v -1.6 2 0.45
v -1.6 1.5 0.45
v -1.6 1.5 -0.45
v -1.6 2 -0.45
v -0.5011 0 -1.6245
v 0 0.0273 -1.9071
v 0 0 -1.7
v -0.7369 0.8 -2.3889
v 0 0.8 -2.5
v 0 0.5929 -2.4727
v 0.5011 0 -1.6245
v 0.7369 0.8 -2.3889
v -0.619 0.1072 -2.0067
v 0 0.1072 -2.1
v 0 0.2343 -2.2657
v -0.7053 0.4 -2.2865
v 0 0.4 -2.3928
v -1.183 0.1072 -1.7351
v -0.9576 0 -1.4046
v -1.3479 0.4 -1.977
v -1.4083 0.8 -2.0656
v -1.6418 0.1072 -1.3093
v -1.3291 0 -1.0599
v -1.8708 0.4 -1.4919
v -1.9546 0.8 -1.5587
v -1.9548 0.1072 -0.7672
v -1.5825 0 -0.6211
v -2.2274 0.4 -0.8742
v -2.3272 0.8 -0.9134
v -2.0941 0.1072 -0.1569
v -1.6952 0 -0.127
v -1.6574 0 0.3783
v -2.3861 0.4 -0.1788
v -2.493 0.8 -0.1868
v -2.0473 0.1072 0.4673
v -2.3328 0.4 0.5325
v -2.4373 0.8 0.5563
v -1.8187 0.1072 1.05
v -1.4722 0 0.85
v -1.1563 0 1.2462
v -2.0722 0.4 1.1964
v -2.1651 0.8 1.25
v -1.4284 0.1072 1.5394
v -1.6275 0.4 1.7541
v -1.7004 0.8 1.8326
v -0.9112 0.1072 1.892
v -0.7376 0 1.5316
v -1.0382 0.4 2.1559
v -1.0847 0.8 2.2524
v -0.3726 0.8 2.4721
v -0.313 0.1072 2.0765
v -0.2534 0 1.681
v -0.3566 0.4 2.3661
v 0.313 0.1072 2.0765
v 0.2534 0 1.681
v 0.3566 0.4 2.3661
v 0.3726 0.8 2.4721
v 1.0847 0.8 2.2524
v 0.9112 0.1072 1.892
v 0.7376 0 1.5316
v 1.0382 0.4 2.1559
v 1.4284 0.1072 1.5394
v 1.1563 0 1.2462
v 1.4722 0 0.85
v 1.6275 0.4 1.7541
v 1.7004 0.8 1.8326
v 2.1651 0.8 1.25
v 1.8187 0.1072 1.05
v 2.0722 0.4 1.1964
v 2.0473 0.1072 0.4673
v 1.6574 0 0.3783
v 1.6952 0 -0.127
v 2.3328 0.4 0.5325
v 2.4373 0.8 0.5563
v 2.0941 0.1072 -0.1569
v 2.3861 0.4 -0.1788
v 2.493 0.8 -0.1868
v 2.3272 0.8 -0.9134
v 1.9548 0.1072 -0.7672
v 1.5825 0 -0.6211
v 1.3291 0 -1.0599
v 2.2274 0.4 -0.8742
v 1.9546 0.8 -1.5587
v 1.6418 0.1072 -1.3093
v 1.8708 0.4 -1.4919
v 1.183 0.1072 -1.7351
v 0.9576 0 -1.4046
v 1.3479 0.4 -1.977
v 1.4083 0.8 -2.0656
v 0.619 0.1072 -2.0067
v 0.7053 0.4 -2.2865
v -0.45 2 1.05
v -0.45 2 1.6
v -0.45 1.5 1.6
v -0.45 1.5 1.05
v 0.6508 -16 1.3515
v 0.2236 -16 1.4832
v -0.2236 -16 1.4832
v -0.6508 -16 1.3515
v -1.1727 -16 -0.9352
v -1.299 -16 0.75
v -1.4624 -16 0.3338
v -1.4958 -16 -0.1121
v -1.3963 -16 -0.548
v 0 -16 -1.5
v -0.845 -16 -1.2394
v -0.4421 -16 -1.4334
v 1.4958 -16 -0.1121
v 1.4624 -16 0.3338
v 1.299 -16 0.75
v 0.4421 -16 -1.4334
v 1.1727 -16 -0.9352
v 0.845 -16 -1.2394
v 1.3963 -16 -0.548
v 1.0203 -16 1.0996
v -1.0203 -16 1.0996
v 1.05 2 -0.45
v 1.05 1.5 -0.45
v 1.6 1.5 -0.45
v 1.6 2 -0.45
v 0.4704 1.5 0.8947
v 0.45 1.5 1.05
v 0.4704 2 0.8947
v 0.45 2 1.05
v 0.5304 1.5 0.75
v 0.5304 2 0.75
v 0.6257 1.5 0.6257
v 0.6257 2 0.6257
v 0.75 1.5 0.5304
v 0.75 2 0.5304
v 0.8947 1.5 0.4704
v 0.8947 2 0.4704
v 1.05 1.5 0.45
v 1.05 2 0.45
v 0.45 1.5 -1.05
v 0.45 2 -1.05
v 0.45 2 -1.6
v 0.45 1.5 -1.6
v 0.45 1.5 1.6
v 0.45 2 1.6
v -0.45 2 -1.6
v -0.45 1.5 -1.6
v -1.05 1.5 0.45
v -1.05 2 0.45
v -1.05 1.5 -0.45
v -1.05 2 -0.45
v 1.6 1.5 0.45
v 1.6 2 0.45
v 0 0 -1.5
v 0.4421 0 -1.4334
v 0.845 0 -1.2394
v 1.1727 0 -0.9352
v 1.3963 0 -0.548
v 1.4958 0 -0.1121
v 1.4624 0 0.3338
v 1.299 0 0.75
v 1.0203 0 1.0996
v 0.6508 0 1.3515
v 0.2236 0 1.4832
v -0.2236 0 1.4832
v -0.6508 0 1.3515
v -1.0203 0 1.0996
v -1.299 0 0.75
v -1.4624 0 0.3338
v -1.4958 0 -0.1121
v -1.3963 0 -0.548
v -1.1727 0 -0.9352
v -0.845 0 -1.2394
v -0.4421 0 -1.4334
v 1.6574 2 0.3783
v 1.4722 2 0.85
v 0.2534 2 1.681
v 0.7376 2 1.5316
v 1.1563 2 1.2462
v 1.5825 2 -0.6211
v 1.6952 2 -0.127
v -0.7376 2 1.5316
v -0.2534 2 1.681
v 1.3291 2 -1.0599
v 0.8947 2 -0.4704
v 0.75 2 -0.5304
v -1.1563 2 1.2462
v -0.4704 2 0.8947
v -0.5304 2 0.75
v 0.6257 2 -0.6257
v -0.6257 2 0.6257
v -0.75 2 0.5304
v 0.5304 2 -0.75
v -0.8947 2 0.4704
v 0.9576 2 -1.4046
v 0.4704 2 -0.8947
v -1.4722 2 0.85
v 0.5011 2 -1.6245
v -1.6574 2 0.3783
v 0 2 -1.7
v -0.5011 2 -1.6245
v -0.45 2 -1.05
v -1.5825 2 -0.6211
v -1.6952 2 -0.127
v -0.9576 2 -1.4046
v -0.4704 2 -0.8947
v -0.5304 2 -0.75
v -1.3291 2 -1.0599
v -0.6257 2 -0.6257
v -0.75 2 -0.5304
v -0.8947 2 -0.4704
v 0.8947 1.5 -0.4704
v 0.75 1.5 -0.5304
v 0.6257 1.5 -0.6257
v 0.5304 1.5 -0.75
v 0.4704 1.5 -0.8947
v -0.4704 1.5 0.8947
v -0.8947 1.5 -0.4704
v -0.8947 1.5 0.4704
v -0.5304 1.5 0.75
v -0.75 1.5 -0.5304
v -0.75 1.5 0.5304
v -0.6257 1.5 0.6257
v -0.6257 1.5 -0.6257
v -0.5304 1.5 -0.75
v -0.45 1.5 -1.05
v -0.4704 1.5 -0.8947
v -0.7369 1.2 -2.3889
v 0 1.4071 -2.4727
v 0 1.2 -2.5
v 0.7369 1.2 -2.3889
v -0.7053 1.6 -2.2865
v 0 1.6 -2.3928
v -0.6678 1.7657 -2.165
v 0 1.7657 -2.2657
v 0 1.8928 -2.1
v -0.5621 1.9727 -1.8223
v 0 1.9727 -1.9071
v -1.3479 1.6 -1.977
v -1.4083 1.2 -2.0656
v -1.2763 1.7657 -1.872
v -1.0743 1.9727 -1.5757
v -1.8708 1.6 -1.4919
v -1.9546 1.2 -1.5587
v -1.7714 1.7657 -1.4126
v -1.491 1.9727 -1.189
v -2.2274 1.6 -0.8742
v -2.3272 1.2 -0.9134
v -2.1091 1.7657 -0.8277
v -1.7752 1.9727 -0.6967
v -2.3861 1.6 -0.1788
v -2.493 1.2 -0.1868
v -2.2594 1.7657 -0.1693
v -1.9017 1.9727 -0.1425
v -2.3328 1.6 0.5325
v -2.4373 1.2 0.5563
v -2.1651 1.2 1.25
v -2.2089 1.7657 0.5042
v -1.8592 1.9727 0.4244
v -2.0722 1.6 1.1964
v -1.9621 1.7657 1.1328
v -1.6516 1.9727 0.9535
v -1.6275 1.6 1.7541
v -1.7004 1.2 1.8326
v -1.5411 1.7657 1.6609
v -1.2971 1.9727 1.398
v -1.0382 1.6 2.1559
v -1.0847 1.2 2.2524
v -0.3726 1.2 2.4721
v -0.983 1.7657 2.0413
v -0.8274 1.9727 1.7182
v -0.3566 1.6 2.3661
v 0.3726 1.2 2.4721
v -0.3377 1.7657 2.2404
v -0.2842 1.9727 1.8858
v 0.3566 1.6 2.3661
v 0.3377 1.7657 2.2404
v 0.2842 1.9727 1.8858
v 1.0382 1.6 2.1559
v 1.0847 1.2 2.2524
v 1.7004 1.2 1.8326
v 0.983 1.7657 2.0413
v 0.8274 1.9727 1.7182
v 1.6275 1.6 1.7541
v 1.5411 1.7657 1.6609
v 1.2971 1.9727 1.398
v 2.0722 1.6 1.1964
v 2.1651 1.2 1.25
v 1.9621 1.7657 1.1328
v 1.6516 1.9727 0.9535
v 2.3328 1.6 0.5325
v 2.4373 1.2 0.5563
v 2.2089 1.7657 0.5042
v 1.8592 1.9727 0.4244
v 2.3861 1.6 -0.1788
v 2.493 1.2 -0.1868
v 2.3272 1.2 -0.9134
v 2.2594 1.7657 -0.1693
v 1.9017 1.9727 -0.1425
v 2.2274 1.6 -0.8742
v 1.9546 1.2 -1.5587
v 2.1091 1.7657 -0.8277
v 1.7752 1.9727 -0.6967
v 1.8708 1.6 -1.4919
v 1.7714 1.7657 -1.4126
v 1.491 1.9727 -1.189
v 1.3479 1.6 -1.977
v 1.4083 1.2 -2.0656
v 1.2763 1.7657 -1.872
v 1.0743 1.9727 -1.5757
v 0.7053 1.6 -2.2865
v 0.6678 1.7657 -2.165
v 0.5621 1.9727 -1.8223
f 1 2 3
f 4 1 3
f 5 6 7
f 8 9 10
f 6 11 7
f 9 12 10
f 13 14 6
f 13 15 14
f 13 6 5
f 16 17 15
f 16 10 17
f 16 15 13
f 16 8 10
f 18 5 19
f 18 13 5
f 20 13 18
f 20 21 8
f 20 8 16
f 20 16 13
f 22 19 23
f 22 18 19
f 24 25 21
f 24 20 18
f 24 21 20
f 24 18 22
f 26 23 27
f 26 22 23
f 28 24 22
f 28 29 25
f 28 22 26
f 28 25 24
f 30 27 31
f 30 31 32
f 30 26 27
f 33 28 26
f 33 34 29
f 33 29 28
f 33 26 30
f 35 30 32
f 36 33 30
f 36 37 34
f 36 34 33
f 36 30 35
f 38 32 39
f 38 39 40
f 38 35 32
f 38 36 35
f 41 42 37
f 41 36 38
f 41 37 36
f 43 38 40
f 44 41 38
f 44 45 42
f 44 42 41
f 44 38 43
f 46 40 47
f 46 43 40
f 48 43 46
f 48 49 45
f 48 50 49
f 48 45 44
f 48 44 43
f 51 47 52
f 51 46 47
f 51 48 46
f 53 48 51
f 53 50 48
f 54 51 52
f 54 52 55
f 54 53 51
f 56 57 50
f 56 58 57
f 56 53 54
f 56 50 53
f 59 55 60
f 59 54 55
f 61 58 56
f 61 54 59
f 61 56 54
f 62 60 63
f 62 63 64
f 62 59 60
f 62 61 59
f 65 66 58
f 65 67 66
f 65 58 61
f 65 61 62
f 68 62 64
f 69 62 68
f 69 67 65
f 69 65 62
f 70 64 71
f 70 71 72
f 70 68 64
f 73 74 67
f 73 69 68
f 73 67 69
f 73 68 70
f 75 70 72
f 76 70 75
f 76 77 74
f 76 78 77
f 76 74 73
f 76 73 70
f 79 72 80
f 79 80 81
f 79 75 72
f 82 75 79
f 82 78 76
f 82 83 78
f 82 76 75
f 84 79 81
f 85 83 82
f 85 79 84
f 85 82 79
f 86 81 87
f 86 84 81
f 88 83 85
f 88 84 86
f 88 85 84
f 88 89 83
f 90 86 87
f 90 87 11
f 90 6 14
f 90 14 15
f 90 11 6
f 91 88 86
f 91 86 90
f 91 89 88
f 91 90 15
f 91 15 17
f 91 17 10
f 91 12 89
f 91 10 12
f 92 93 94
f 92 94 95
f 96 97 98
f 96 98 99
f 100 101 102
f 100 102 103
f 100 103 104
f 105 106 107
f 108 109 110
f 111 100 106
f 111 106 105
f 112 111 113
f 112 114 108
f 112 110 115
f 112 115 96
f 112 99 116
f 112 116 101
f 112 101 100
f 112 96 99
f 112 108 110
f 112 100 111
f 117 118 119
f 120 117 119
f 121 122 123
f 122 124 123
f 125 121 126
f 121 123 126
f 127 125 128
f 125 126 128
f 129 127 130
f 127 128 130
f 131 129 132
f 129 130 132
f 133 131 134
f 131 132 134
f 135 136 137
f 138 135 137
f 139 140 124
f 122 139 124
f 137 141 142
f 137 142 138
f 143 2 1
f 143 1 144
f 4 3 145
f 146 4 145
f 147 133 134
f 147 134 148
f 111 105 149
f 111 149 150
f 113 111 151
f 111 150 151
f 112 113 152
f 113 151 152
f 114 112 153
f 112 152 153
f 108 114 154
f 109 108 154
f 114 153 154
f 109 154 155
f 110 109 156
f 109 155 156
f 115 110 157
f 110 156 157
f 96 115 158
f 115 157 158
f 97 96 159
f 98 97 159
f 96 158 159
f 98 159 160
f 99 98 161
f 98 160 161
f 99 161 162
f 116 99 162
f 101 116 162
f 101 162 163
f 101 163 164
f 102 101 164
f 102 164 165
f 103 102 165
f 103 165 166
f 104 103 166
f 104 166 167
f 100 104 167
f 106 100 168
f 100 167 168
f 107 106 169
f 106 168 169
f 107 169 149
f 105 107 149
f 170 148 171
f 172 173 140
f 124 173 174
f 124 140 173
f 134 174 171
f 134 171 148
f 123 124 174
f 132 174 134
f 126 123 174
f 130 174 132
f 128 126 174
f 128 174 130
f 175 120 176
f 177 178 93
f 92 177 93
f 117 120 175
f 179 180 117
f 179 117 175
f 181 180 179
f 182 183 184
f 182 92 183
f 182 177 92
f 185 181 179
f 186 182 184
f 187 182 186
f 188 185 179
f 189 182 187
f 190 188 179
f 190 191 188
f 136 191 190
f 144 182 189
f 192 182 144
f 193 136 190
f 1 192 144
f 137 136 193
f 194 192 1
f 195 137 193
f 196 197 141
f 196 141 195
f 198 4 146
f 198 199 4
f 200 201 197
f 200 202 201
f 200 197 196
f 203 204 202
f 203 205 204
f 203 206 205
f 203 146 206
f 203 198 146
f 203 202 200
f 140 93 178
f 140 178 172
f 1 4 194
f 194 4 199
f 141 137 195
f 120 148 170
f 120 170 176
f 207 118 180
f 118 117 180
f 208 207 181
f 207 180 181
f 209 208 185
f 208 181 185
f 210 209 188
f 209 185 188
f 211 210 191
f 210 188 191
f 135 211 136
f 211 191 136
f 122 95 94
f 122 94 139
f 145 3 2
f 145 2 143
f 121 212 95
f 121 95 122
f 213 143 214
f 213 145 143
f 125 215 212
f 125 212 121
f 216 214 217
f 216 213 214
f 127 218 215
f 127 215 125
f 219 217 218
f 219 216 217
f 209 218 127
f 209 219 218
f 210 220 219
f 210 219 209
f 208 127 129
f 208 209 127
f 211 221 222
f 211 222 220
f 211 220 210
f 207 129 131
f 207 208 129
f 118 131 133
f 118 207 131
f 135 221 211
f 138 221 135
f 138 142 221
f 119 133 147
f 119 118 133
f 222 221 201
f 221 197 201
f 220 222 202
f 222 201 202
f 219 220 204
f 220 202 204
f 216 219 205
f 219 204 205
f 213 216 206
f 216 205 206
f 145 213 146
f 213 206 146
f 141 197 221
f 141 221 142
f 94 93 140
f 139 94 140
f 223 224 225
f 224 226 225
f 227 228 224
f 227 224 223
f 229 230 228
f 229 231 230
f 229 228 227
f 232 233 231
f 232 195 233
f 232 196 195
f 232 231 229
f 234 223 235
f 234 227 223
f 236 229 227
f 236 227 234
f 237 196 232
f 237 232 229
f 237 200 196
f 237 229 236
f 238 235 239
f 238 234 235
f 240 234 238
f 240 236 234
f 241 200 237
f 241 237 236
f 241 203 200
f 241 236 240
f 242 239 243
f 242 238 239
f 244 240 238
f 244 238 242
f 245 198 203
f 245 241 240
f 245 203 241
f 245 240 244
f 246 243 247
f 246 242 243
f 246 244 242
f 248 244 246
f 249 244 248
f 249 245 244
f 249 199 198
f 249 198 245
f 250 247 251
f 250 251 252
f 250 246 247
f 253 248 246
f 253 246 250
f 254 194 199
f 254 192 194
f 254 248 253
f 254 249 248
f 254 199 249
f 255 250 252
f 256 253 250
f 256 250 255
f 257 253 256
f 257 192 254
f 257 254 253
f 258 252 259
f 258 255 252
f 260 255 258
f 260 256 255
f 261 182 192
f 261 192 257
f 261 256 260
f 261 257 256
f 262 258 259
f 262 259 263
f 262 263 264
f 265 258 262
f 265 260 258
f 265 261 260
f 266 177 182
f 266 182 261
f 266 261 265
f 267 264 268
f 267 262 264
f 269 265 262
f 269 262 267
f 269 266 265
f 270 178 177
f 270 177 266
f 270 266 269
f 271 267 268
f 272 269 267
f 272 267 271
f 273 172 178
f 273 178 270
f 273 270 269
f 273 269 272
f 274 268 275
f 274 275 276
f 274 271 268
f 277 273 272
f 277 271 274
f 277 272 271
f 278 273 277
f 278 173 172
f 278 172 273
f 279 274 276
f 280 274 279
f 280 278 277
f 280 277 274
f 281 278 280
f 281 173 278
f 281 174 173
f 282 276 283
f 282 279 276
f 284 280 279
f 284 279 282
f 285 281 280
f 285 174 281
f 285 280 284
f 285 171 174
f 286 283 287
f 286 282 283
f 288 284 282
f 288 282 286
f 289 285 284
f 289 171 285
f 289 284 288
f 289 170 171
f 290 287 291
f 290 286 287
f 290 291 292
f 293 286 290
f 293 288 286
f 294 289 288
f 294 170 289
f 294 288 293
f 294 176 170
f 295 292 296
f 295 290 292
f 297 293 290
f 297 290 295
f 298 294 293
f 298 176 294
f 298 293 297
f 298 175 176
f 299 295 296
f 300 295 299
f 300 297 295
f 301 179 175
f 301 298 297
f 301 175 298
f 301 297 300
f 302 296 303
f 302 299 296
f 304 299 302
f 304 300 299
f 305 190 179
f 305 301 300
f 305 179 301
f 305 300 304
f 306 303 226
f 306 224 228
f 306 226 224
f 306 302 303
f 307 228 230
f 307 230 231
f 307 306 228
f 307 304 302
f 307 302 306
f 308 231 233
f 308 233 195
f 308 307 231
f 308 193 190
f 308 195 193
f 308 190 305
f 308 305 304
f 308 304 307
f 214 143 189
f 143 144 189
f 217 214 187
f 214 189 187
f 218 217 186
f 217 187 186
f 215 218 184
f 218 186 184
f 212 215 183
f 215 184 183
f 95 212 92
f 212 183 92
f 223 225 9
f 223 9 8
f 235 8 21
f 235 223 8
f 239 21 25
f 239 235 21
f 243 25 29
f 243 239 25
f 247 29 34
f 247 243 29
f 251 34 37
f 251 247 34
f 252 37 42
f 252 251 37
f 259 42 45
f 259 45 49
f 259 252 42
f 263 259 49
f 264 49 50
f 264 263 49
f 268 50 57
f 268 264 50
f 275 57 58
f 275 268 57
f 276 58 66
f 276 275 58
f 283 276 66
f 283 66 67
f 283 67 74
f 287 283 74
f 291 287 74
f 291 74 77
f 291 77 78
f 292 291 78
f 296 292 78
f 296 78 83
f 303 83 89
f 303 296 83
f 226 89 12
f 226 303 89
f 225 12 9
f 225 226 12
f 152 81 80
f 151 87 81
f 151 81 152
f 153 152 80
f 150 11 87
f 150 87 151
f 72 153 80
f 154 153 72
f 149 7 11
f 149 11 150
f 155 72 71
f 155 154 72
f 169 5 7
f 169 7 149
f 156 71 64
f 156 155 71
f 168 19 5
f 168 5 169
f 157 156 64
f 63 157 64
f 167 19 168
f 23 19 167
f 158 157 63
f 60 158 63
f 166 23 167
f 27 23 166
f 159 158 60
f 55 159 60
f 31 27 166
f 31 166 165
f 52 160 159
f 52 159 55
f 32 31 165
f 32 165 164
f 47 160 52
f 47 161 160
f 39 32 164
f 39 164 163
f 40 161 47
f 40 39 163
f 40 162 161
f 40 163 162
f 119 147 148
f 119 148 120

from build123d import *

# Parameters (mm, degrees)
FILLET2_R           = 0.8
SKETCH3_W           = 0.9
SKETCH3_H           = 3.2
CUT_EXTRUDE1_DEPTH  = 0.5
SKETCH4_W           = 3.2
SKETCH4_H           = 0.9
CUT_EXTRUDE2_DEPTH  = 4.840572939
FILLET1_R           = 0.6
SKETCH2_R           = 1.5
BOSS_EXTRUDE1_DEPTH = 16


with BuildPart() as part:
    # Sketch1 → Revolve1 (revolve)
    with BuildSketch(Plane(origin=(0, 0, 0), x_dir=(0, 0, -1), z_dir=(1, 0, 0))):
        with BuildLine():
            Line((0, 2), (0, 0))
            Line((0, 0), (2.5, 0))
            ThreePointArc((2.5, 0), (1.914213562, 1.414213562), (0.5, 2))
            Line((0.5, 2), (0, 2))
        make_face()
        with BuildLine():
            ThreePointArc((0.5, 2), (1.914213562, 1.414213562), (2.5, 0))
            Line((2.5, 0), (2.5, 2))
            Line((2.5, 2), (0.5, 2))
        make_face()
    revolve(axis=Axis((0, 0, 0), (0, 1, 0)))

    # Fillet2
    fillet2_edges = [part.edges().sort_by_distance(p)[0] for p in [
        (0, 2, 2.5),
        (0, 0, 2.5),
    ]]
    fillet(fillet2_edges, radius=FILLET2_R)

    # Sketch3 → Cut-Extrude1 (cut)
    with BuildSketch(Plane(origin=(0, 2, 0), x_dir=(1, 0, 0), z_dir=(0, 1, 0))):
        Rectangle(SKETCH3_W, SKETCH3_H)
    extrude(amount=-CUT_EXTRUDE1_DEPTH, mode=Mode.SUBTRACT)

    # Sketch4 → Cut-Extrude2 (cut, through all)
    with BuildSketch(Plane(origin=(0, 1.5, 0), x_dir=(1, 0, 0), z_dir=(0, 1, 0))):
        Rectangle(SKETCH4_W, SKETCH4_H)
    extrude(amount=CUT_EXTRUDE2_DEPTH, mode=Mode.SUBTRACT)

    # Fillet1
    fillet1_edges = [part.edges().sort_by_distance(p)[0] for p in [
        (0.45, 1.75, -0.45),
        (0.45, 1.75, 0.45),
        (-0.45, 1.75, -0.45),
        (-0.45, 1.75, 0.45),
    ]]
    fillet(fillet1_edges, radius=FILLET1_R)

    # Sketch2 → Boss-Extrude1 (add)
    with BuildSketch(Plane.XZ):
        with Locations(Location((0, 0, 0), (0, 0, 270))):
            Circle(SKETCH2_R)
    extrude(amount=BOSS_EXTRUDE1_DEPTH)


solid = part.part
